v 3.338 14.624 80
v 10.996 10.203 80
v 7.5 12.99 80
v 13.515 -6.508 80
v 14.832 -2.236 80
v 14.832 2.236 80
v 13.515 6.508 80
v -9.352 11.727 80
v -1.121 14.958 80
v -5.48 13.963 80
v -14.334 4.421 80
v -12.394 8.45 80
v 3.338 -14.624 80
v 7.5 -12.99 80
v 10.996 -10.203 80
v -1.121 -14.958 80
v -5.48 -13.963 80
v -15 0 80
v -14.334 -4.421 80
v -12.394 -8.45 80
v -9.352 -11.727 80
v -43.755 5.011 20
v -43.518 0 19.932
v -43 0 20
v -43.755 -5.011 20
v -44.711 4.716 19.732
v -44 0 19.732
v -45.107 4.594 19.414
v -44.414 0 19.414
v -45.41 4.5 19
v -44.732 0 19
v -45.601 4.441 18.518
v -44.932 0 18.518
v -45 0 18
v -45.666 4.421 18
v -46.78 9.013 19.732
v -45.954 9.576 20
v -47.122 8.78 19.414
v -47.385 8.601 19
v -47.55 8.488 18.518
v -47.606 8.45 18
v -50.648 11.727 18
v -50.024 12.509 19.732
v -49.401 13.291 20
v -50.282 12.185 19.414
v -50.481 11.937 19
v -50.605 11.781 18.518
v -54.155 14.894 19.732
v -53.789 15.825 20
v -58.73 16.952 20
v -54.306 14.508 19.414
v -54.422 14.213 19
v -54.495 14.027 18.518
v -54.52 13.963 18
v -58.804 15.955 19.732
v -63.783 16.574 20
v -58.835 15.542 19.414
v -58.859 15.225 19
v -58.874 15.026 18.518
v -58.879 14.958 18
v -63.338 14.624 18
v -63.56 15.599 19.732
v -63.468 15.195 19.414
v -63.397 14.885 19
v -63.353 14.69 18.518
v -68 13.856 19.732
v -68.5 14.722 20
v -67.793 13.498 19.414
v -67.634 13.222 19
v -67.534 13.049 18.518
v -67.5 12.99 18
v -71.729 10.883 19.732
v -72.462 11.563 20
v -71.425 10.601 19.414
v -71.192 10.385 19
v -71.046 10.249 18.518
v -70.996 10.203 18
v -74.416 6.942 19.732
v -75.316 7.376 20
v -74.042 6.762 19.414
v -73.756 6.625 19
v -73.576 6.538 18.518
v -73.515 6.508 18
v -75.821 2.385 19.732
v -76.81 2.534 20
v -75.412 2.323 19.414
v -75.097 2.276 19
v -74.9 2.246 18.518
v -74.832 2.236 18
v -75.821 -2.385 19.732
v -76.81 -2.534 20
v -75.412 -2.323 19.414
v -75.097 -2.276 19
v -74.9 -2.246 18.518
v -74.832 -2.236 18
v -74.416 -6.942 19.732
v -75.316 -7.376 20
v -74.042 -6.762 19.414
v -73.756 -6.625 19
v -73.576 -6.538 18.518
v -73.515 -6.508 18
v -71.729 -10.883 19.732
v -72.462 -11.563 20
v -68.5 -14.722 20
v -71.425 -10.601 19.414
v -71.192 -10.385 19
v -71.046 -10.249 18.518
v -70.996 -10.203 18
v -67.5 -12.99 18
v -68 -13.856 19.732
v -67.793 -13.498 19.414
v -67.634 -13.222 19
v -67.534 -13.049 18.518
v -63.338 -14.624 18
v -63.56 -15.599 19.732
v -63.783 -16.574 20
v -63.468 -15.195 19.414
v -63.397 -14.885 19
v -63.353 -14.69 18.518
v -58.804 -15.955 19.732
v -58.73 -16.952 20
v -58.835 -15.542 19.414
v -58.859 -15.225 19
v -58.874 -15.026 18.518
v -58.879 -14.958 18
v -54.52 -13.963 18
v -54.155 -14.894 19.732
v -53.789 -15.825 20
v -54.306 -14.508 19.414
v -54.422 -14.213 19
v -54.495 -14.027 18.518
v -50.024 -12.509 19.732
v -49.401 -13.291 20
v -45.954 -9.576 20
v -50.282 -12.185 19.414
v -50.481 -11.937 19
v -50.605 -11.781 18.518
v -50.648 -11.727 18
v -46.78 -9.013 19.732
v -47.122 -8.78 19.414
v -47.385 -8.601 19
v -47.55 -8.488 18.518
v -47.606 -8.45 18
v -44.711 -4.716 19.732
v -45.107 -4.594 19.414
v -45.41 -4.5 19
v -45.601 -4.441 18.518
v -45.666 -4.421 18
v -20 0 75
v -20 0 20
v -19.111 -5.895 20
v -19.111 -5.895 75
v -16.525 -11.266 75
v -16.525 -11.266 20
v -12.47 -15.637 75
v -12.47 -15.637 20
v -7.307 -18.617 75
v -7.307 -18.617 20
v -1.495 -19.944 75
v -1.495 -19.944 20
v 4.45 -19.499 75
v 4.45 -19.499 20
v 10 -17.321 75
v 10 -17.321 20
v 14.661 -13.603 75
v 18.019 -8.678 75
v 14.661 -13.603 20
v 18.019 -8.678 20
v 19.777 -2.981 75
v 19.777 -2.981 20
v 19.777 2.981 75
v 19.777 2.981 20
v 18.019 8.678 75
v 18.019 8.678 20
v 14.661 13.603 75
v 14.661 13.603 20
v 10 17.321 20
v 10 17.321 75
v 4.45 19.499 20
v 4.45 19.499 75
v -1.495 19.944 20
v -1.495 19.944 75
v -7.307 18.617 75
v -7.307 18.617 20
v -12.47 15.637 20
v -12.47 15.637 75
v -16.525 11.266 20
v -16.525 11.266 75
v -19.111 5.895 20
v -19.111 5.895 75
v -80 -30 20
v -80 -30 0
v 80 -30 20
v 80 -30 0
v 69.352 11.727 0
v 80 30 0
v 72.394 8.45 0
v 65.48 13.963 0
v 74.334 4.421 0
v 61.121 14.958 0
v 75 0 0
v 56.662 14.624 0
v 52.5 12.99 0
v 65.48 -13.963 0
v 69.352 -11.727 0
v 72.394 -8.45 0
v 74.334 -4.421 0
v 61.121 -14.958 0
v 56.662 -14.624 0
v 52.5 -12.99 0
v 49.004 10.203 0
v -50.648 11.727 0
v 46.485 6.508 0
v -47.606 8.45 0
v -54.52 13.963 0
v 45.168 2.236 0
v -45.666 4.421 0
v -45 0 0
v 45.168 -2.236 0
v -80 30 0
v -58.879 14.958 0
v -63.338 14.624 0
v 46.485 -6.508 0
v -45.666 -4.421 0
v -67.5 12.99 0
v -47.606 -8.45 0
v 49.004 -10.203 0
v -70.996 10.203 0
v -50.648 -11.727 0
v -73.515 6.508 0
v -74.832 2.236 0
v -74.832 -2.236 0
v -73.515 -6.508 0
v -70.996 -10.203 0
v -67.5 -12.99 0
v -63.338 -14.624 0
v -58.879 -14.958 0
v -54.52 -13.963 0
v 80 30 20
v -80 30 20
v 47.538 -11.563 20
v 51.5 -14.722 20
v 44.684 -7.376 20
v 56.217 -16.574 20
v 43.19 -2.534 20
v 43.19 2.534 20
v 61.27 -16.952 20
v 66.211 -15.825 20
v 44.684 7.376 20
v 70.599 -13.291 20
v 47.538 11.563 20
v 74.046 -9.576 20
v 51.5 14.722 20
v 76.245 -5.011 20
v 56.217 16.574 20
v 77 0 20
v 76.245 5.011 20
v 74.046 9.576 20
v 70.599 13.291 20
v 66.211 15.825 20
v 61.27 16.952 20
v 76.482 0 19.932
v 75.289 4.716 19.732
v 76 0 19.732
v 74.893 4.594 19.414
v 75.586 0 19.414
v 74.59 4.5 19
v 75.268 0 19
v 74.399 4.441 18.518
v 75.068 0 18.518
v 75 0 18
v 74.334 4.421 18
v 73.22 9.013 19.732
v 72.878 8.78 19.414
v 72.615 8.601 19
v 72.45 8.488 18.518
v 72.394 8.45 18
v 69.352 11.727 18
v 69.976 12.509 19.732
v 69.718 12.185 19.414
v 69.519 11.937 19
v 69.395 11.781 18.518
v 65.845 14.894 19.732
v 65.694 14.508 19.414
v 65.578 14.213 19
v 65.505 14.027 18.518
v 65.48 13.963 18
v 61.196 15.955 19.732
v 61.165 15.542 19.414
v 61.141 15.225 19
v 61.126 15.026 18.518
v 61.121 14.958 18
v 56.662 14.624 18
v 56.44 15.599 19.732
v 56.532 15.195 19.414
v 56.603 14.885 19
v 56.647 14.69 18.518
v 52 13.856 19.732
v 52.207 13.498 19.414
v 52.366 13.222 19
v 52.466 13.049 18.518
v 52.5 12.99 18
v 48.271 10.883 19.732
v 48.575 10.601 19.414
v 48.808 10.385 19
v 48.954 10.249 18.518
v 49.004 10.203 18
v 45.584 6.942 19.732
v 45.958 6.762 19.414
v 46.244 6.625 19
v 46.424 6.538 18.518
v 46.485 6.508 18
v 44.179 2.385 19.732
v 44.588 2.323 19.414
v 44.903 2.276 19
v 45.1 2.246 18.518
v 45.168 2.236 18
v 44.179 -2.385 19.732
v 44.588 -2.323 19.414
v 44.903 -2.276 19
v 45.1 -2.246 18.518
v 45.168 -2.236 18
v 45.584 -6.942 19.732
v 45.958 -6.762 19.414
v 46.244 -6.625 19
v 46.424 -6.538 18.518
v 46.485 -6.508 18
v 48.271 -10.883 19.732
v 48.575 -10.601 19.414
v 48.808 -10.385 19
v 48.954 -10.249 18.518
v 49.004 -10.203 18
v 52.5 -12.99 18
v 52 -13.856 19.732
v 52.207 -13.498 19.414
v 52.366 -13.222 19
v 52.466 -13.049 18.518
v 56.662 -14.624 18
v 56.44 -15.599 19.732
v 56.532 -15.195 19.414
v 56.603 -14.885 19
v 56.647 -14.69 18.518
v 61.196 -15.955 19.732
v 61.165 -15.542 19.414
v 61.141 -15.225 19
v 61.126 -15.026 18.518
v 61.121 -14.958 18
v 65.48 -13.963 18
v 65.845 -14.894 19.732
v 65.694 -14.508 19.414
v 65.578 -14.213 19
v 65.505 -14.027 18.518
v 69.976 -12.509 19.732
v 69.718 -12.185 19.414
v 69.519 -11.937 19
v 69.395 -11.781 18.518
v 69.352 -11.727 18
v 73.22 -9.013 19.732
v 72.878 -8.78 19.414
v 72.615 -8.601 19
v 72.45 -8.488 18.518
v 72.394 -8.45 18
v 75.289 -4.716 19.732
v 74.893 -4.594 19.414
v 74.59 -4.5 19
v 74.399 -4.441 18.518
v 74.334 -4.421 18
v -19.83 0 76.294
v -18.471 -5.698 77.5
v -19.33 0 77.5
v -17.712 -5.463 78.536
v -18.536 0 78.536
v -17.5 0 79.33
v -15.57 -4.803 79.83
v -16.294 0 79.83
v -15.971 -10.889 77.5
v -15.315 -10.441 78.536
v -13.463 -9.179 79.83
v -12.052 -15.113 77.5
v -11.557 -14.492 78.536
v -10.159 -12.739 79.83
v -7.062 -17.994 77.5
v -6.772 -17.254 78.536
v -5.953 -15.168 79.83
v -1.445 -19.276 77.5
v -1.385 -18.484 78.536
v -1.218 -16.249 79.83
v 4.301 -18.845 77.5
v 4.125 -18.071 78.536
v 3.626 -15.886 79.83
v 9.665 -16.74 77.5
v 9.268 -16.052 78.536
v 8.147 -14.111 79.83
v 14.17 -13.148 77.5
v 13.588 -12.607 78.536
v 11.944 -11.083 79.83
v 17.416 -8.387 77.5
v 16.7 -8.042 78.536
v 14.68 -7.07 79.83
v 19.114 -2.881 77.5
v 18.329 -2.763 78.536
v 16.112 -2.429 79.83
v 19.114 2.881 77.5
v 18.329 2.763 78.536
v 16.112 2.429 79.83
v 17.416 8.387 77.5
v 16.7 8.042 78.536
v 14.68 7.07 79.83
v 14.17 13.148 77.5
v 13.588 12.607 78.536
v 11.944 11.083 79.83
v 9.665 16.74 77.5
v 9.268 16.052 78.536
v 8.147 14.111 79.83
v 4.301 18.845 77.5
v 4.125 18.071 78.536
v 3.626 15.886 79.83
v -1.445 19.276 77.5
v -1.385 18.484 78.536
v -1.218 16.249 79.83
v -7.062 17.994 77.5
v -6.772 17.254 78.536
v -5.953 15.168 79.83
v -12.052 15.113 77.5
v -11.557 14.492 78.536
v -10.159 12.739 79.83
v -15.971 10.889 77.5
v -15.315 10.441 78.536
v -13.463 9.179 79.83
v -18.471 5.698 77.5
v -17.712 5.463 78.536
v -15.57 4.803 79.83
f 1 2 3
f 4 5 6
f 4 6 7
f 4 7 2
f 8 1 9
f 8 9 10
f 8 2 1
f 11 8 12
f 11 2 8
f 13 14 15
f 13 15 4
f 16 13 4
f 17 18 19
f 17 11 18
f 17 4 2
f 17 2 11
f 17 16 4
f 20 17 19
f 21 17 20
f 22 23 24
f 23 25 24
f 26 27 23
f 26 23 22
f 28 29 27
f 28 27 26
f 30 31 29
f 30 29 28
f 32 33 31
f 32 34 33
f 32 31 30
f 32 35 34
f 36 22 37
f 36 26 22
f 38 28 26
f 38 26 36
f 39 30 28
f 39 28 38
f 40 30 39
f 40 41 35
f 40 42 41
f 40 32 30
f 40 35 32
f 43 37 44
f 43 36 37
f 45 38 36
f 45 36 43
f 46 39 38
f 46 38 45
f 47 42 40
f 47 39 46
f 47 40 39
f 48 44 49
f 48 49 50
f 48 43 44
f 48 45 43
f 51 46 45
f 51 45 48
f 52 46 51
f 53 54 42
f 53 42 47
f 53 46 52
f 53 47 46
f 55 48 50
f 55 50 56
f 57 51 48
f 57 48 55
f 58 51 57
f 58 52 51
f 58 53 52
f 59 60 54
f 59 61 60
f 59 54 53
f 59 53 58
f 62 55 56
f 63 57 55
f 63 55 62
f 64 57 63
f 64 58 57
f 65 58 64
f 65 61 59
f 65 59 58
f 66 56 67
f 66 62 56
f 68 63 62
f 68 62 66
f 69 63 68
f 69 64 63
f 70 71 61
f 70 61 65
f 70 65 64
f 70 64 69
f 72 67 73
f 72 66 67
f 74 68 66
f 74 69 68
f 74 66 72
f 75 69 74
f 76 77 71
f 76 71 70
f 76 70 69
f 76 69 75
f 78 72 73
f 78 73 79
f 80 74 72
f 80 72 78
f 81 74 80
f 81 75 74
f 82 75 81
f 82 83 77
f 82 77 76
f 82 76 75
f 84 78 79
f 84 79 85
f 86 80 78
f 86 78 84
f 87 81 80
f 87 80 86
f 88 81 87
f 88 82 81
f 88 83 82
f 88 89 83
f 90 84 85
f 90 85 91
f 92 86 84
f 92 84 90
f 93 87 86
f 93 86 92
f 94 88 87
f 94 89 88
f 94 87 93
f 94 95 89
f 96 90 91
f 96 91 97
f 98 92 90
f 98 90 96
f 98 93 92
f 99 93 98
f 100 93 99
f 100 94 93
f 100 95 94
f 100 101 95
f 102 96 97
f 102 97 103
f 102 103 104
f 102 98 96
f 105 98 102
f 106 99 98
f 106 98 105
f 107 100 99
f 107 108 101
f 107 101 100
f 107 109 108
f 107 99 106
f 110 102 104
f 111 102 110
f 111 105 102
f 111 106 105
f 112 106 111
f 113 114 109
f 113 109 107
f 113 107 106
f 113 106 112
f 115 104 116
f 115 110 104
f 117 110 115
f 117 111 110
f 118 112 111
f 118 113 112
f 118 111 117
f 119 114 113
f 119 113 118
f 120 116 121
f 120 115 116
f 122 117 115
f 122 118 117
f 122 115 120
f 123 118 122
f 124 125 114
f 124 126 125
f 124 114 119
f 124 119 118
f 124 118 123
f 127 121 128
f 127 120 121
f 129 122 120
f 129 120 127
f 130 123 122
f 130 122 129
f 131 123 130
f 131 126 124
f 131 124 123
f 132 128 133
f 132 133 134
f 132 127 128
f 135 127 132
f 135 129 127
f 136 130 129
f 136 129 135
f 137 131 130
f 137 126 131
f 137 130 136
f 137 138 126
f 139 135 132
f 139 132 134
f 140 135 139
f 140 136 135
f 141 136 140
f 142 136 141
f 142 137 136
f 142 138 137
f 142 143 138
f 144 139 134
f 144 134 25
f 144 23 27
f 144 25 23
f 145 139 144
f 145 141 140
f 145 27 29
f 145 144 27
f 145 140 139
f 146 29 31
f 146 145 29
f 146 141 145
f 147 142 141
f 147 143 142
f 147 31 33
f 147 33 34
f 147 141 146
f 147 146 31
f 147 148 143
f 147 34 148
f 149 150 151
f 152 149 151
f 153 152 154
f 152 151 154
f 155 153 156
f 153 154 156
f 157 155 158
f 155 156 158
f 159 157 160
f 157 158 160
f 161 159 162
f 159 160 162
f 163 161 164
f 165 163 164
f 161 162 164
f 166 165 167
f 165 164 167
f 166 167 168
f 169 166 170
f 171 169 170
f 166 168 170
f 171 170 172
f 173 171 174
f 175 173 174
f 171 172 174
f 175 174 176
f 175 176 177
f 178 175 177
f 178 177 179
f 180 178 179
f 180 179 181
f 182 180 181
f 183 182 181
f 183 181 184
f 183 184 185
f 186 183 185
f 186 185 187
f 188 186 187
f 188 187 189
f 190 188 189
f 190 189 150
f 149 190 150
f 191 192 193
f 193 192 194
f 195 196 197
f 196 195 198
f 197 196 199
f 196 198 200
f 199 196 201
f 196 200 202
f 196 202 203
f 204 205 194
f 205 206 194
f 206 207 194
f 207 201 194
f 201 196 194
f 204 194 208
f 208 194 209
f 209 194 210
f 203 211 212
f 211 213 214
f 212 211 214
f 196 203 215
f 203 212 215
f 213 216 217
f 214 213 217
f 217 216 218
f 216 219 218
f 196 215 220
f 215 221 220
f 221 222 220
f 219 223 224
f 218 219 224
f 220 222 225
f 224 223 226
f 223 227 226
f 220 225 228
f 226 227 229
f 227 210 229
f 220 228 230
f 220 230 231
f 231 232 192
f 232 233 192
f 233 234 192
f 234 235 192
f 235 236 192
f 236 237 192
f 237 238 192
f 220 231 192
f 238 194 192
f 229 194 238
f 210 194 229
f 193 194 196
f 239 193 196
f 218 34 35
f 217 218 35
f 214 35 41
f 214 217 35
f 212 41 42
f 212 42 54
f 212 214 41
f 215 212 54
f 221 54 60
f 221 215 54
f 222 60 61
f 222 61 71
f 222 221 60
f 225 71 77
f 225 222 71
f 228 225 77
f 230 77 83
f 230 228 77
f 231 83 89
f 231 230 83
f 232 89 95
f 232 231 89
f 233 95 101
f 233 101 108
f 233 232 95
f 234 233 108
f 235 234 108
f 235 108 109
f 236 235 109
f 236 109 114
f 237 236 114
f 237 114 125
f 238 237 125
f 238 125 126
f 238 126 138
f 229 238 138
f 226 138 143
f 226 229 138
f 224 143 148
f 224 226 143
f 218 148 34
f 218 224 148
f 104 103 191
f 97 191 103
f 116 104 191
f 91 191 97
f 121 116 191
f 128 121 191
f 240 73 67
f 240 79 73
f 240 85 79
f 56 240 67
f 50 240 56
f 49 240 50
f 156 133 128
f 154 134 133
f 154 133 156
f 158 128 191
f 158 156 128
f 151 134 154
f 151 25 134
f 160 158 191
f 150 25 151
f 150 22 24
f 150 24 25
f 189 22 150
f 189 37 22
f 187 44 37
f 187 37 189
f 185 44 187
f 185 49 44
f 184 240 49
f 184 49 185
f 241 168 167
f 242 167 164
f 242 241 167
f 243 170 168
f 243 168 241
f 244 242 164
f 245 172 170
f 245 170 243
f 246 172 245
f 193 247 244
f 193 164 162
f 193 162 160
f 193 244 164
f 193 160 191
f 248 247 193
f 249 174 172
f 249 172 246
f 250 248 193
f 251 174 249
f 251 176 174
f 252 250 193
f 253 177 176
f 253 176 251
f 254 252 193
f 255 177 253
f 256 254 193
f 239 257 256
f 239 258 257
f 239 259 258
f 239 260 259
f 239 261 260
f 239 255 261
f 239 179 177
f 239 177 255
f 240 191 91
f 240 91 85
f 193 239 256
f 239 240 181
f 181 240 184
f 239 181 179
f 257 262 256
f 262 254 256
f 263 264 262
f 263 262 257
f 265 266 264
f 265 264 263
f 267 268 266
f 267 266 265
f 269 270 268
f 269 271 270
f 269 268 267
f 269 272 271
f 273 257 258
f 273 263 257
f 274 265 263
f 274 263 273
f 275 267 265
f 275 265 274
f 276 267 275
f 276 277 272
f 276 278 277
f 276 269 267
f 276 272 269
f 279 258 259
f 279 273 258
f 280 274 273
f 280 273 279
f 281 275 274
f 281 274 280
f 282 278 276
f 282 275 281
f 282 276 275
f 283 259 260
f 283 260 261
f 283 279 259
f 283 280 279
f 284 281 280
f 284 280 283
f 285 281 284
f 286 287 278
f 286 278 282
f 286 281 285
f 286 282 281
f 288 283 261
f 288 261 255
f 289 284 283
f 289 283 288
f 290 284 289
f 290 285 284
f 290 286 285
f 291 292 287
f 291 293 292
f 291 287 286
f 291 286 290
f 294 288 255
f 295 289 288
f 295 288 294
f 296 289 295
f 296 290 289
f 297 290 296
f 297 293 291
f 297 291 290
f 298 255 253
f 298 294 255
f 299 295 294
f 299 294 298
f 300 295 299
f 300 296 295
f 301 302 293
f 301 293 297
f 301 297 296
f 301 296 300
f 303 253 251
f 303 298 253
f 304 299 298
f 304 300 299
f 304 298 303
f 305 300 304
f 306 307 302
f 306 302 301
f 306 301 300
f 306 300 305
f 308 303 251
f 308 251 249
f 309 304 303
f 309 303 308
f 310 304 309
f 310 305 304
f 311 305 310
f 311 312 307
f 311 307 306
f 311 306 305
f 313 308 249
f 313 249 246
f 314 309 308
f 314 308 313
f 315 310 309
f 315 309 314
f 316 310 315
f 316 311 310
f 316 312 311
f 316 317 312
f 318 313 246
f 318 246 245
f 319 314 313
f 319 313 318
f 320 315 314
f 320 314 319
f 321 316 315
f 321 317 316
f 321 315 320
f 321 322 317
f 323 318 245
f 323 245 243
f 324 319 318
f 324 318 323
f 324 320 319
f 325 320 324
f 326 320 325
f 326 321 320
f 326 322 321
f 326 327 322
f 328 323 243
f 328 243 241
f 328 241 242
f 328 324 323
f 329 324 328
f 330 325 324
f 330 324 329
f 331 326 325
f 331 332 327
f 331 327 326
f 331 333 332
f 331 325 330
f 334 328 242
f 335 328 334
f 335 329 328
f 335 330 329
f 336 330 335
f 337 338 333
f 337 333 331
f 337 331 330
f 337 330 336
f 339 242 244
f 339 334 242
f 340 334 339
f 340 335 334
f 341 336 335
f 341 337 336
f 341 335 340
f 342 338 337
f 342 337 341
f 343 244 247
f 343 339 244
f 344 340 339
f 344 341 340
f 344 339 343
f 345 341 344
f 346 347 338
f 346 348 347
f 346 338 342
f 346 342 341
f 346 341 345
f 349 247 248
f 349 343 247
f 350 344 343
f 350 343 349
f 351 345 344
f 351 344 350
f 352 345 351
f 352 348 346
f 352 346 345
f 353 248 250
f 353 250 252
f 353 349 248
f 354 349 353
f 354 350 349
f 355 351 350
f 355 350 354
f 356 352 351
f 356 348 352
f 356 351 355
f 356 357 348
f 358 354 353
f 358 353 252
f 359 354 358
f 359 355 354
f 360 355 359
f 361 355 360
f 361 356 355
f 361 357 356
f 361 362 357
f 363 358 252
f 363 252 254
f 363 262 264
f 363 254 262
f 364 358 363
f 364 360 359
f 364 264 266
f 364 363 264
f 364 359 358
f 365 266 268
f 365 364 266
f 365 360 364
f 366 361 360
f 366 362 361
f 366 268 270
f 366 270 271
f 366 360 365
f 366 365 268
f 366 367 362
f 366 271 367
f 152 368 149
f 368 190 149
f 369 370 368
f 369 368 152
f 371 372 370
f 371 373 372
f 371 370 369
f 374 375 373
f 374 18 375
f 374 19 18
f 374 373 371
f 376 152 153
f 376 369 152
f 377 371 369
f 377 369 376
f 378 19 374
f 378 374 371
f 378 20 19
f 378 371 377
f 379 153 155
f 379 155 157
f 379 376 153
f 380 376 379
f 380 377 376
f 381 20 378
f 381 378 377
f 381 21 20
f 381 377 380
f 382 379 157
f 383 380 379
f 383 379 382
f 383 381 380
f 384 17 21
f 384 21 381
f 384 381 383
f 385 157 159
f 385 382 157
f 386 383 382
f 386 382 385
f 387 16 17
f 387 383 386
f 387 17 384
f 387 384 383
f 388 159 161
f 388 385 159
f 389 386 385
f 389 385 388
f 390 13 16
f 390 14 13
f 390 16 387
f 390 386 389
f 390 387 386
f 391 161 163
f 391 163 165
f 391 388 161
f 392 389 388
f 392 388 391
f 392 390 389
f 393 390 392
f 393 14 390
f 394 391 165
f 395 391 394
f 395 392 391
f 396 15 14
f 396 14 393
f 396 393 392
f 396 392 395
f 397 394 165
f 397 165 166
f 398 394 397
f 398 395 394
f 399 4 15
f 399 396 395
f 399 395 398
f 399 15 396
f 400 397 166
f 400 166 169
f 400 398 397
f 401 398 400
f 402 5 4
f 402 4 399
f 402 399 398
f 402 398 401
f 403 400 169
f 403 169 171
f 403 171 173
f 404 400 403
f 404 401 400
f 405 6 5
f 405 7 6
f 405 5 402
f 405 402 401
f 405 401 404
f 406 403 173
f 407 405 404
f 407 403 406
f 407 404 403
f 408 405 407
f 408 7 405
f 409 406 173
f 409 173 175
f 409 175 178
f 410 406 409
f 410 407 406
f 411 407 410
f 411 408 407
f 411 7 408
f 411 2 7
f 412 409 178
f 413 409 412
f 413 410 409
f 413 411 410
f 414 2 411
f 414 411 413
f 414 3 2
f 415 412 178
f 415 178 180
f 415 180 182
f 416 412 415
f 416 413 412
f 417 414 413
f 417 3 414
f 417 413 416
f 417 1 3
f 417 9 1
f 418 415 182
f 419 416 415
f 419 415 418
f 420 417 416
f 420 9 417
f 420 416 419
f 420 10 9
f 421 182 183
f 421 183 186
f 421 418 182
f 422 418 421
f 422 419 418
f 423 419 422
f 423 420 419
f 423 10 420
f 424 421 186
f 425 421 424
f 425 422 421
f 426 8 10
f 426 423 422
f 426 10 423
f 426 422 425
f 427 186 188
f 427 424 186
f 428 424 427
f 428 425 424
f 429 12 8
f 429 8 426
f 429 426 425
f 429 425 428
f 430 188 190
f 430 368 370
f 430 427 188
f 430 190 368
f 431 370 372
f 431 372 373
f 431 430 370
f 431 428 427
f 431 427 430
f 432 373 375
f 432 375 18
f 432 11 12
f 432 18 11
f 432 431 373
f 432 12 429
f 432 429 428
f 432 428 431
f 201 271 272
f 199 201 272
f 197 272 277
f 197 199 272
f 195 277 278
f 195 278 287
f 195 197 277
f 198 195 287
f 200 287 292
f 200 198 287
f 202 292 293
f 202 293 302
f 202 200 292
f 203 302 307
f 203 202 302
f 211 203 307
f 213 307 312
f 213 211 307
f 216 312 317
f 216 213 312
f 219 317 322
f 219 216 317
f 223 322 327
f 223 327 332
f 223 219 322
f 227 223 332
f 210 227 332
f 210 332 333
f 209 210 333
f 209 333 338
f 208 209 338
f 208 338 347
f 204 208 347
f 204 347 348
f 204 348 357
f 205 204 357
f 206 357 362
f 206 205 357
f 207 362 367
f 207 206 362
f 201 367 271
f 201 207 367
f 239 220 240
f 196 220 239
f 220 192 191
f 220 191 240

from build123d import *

# Parameters (mm, degrees)
SKETCH4_W               = 160
SKETCH4_H               = 60
BOSS_EXTRUDE1_DEPTH     = 20
SKETCH6_R               = 20
BOSS_EXTRUDE2_DEPTH     = 80
BOSS_EXTRUDE3_OUTLINE_R = 15
BOSS_EXTRUDE3_DEPTH     = 20
FILLET3_R               = 5
FILLET4_R               = 2
FILLET5_R               = 2


# Read off the part's stored shape, not the designer's step: Boss-Extrude3
with BuildPart() as part:
    # Sketch4 → Boss-Extrude1 (new body)
    with BuildSketch(Plane.XY):
        Rectangle(SKETCH4_W, SKETCH4_H)
    extrude(amount=BOSS_EXTRUDE1_DEPTH)

    # Sketch6 → Boss-Extrude2 (add)
    with BuildSketch(Plane.XY):
        with Locations(Location((0, 0, 0), (0, 0, 180))):
            Circle(SKETCH6_R)
    extrude(amount=BOSS_EXTRUDE2_DEPTH)

    # Boss-Extrude3 outline → Boss-Extrude3 (cut)
    with BuildSketch(Plane.XY):
        with Locations((60, 0)):
            Circle(BOSS_EXTRUDE3_OUTLINE_R)
        with Locations((-60, 0)):
            Circle(BOSS_EXTRUDE3_OUTLINE_R)
    extrude(amount=BOSS_EXTRUDE3_DEPTH, mode=Mode.SUBTRACT)

    # Fillet3
    fillet3_edges = [part.edges().sort_by_distance(p)[0] for p in [
        (20, 0, 80),
    ]]
    fillet(fillet3_edges, radius=FILLET3_R)

    # Fillet4
    fillet4_edges = [part.edges().sort_by_distance(p)[0] for p in [
        (-75, 0, 20),
    ]]
    fillet(fillet4_edges, radius=FILLET4_R)

    # Fillet5
    fillet5_edges = [part.edges().sort_by_distance(p)[0] for p in [
        (45, 0, 20),
    ]]
    fillet(fillet5_edges, radius=FILLET5_R)


solid = part.part
